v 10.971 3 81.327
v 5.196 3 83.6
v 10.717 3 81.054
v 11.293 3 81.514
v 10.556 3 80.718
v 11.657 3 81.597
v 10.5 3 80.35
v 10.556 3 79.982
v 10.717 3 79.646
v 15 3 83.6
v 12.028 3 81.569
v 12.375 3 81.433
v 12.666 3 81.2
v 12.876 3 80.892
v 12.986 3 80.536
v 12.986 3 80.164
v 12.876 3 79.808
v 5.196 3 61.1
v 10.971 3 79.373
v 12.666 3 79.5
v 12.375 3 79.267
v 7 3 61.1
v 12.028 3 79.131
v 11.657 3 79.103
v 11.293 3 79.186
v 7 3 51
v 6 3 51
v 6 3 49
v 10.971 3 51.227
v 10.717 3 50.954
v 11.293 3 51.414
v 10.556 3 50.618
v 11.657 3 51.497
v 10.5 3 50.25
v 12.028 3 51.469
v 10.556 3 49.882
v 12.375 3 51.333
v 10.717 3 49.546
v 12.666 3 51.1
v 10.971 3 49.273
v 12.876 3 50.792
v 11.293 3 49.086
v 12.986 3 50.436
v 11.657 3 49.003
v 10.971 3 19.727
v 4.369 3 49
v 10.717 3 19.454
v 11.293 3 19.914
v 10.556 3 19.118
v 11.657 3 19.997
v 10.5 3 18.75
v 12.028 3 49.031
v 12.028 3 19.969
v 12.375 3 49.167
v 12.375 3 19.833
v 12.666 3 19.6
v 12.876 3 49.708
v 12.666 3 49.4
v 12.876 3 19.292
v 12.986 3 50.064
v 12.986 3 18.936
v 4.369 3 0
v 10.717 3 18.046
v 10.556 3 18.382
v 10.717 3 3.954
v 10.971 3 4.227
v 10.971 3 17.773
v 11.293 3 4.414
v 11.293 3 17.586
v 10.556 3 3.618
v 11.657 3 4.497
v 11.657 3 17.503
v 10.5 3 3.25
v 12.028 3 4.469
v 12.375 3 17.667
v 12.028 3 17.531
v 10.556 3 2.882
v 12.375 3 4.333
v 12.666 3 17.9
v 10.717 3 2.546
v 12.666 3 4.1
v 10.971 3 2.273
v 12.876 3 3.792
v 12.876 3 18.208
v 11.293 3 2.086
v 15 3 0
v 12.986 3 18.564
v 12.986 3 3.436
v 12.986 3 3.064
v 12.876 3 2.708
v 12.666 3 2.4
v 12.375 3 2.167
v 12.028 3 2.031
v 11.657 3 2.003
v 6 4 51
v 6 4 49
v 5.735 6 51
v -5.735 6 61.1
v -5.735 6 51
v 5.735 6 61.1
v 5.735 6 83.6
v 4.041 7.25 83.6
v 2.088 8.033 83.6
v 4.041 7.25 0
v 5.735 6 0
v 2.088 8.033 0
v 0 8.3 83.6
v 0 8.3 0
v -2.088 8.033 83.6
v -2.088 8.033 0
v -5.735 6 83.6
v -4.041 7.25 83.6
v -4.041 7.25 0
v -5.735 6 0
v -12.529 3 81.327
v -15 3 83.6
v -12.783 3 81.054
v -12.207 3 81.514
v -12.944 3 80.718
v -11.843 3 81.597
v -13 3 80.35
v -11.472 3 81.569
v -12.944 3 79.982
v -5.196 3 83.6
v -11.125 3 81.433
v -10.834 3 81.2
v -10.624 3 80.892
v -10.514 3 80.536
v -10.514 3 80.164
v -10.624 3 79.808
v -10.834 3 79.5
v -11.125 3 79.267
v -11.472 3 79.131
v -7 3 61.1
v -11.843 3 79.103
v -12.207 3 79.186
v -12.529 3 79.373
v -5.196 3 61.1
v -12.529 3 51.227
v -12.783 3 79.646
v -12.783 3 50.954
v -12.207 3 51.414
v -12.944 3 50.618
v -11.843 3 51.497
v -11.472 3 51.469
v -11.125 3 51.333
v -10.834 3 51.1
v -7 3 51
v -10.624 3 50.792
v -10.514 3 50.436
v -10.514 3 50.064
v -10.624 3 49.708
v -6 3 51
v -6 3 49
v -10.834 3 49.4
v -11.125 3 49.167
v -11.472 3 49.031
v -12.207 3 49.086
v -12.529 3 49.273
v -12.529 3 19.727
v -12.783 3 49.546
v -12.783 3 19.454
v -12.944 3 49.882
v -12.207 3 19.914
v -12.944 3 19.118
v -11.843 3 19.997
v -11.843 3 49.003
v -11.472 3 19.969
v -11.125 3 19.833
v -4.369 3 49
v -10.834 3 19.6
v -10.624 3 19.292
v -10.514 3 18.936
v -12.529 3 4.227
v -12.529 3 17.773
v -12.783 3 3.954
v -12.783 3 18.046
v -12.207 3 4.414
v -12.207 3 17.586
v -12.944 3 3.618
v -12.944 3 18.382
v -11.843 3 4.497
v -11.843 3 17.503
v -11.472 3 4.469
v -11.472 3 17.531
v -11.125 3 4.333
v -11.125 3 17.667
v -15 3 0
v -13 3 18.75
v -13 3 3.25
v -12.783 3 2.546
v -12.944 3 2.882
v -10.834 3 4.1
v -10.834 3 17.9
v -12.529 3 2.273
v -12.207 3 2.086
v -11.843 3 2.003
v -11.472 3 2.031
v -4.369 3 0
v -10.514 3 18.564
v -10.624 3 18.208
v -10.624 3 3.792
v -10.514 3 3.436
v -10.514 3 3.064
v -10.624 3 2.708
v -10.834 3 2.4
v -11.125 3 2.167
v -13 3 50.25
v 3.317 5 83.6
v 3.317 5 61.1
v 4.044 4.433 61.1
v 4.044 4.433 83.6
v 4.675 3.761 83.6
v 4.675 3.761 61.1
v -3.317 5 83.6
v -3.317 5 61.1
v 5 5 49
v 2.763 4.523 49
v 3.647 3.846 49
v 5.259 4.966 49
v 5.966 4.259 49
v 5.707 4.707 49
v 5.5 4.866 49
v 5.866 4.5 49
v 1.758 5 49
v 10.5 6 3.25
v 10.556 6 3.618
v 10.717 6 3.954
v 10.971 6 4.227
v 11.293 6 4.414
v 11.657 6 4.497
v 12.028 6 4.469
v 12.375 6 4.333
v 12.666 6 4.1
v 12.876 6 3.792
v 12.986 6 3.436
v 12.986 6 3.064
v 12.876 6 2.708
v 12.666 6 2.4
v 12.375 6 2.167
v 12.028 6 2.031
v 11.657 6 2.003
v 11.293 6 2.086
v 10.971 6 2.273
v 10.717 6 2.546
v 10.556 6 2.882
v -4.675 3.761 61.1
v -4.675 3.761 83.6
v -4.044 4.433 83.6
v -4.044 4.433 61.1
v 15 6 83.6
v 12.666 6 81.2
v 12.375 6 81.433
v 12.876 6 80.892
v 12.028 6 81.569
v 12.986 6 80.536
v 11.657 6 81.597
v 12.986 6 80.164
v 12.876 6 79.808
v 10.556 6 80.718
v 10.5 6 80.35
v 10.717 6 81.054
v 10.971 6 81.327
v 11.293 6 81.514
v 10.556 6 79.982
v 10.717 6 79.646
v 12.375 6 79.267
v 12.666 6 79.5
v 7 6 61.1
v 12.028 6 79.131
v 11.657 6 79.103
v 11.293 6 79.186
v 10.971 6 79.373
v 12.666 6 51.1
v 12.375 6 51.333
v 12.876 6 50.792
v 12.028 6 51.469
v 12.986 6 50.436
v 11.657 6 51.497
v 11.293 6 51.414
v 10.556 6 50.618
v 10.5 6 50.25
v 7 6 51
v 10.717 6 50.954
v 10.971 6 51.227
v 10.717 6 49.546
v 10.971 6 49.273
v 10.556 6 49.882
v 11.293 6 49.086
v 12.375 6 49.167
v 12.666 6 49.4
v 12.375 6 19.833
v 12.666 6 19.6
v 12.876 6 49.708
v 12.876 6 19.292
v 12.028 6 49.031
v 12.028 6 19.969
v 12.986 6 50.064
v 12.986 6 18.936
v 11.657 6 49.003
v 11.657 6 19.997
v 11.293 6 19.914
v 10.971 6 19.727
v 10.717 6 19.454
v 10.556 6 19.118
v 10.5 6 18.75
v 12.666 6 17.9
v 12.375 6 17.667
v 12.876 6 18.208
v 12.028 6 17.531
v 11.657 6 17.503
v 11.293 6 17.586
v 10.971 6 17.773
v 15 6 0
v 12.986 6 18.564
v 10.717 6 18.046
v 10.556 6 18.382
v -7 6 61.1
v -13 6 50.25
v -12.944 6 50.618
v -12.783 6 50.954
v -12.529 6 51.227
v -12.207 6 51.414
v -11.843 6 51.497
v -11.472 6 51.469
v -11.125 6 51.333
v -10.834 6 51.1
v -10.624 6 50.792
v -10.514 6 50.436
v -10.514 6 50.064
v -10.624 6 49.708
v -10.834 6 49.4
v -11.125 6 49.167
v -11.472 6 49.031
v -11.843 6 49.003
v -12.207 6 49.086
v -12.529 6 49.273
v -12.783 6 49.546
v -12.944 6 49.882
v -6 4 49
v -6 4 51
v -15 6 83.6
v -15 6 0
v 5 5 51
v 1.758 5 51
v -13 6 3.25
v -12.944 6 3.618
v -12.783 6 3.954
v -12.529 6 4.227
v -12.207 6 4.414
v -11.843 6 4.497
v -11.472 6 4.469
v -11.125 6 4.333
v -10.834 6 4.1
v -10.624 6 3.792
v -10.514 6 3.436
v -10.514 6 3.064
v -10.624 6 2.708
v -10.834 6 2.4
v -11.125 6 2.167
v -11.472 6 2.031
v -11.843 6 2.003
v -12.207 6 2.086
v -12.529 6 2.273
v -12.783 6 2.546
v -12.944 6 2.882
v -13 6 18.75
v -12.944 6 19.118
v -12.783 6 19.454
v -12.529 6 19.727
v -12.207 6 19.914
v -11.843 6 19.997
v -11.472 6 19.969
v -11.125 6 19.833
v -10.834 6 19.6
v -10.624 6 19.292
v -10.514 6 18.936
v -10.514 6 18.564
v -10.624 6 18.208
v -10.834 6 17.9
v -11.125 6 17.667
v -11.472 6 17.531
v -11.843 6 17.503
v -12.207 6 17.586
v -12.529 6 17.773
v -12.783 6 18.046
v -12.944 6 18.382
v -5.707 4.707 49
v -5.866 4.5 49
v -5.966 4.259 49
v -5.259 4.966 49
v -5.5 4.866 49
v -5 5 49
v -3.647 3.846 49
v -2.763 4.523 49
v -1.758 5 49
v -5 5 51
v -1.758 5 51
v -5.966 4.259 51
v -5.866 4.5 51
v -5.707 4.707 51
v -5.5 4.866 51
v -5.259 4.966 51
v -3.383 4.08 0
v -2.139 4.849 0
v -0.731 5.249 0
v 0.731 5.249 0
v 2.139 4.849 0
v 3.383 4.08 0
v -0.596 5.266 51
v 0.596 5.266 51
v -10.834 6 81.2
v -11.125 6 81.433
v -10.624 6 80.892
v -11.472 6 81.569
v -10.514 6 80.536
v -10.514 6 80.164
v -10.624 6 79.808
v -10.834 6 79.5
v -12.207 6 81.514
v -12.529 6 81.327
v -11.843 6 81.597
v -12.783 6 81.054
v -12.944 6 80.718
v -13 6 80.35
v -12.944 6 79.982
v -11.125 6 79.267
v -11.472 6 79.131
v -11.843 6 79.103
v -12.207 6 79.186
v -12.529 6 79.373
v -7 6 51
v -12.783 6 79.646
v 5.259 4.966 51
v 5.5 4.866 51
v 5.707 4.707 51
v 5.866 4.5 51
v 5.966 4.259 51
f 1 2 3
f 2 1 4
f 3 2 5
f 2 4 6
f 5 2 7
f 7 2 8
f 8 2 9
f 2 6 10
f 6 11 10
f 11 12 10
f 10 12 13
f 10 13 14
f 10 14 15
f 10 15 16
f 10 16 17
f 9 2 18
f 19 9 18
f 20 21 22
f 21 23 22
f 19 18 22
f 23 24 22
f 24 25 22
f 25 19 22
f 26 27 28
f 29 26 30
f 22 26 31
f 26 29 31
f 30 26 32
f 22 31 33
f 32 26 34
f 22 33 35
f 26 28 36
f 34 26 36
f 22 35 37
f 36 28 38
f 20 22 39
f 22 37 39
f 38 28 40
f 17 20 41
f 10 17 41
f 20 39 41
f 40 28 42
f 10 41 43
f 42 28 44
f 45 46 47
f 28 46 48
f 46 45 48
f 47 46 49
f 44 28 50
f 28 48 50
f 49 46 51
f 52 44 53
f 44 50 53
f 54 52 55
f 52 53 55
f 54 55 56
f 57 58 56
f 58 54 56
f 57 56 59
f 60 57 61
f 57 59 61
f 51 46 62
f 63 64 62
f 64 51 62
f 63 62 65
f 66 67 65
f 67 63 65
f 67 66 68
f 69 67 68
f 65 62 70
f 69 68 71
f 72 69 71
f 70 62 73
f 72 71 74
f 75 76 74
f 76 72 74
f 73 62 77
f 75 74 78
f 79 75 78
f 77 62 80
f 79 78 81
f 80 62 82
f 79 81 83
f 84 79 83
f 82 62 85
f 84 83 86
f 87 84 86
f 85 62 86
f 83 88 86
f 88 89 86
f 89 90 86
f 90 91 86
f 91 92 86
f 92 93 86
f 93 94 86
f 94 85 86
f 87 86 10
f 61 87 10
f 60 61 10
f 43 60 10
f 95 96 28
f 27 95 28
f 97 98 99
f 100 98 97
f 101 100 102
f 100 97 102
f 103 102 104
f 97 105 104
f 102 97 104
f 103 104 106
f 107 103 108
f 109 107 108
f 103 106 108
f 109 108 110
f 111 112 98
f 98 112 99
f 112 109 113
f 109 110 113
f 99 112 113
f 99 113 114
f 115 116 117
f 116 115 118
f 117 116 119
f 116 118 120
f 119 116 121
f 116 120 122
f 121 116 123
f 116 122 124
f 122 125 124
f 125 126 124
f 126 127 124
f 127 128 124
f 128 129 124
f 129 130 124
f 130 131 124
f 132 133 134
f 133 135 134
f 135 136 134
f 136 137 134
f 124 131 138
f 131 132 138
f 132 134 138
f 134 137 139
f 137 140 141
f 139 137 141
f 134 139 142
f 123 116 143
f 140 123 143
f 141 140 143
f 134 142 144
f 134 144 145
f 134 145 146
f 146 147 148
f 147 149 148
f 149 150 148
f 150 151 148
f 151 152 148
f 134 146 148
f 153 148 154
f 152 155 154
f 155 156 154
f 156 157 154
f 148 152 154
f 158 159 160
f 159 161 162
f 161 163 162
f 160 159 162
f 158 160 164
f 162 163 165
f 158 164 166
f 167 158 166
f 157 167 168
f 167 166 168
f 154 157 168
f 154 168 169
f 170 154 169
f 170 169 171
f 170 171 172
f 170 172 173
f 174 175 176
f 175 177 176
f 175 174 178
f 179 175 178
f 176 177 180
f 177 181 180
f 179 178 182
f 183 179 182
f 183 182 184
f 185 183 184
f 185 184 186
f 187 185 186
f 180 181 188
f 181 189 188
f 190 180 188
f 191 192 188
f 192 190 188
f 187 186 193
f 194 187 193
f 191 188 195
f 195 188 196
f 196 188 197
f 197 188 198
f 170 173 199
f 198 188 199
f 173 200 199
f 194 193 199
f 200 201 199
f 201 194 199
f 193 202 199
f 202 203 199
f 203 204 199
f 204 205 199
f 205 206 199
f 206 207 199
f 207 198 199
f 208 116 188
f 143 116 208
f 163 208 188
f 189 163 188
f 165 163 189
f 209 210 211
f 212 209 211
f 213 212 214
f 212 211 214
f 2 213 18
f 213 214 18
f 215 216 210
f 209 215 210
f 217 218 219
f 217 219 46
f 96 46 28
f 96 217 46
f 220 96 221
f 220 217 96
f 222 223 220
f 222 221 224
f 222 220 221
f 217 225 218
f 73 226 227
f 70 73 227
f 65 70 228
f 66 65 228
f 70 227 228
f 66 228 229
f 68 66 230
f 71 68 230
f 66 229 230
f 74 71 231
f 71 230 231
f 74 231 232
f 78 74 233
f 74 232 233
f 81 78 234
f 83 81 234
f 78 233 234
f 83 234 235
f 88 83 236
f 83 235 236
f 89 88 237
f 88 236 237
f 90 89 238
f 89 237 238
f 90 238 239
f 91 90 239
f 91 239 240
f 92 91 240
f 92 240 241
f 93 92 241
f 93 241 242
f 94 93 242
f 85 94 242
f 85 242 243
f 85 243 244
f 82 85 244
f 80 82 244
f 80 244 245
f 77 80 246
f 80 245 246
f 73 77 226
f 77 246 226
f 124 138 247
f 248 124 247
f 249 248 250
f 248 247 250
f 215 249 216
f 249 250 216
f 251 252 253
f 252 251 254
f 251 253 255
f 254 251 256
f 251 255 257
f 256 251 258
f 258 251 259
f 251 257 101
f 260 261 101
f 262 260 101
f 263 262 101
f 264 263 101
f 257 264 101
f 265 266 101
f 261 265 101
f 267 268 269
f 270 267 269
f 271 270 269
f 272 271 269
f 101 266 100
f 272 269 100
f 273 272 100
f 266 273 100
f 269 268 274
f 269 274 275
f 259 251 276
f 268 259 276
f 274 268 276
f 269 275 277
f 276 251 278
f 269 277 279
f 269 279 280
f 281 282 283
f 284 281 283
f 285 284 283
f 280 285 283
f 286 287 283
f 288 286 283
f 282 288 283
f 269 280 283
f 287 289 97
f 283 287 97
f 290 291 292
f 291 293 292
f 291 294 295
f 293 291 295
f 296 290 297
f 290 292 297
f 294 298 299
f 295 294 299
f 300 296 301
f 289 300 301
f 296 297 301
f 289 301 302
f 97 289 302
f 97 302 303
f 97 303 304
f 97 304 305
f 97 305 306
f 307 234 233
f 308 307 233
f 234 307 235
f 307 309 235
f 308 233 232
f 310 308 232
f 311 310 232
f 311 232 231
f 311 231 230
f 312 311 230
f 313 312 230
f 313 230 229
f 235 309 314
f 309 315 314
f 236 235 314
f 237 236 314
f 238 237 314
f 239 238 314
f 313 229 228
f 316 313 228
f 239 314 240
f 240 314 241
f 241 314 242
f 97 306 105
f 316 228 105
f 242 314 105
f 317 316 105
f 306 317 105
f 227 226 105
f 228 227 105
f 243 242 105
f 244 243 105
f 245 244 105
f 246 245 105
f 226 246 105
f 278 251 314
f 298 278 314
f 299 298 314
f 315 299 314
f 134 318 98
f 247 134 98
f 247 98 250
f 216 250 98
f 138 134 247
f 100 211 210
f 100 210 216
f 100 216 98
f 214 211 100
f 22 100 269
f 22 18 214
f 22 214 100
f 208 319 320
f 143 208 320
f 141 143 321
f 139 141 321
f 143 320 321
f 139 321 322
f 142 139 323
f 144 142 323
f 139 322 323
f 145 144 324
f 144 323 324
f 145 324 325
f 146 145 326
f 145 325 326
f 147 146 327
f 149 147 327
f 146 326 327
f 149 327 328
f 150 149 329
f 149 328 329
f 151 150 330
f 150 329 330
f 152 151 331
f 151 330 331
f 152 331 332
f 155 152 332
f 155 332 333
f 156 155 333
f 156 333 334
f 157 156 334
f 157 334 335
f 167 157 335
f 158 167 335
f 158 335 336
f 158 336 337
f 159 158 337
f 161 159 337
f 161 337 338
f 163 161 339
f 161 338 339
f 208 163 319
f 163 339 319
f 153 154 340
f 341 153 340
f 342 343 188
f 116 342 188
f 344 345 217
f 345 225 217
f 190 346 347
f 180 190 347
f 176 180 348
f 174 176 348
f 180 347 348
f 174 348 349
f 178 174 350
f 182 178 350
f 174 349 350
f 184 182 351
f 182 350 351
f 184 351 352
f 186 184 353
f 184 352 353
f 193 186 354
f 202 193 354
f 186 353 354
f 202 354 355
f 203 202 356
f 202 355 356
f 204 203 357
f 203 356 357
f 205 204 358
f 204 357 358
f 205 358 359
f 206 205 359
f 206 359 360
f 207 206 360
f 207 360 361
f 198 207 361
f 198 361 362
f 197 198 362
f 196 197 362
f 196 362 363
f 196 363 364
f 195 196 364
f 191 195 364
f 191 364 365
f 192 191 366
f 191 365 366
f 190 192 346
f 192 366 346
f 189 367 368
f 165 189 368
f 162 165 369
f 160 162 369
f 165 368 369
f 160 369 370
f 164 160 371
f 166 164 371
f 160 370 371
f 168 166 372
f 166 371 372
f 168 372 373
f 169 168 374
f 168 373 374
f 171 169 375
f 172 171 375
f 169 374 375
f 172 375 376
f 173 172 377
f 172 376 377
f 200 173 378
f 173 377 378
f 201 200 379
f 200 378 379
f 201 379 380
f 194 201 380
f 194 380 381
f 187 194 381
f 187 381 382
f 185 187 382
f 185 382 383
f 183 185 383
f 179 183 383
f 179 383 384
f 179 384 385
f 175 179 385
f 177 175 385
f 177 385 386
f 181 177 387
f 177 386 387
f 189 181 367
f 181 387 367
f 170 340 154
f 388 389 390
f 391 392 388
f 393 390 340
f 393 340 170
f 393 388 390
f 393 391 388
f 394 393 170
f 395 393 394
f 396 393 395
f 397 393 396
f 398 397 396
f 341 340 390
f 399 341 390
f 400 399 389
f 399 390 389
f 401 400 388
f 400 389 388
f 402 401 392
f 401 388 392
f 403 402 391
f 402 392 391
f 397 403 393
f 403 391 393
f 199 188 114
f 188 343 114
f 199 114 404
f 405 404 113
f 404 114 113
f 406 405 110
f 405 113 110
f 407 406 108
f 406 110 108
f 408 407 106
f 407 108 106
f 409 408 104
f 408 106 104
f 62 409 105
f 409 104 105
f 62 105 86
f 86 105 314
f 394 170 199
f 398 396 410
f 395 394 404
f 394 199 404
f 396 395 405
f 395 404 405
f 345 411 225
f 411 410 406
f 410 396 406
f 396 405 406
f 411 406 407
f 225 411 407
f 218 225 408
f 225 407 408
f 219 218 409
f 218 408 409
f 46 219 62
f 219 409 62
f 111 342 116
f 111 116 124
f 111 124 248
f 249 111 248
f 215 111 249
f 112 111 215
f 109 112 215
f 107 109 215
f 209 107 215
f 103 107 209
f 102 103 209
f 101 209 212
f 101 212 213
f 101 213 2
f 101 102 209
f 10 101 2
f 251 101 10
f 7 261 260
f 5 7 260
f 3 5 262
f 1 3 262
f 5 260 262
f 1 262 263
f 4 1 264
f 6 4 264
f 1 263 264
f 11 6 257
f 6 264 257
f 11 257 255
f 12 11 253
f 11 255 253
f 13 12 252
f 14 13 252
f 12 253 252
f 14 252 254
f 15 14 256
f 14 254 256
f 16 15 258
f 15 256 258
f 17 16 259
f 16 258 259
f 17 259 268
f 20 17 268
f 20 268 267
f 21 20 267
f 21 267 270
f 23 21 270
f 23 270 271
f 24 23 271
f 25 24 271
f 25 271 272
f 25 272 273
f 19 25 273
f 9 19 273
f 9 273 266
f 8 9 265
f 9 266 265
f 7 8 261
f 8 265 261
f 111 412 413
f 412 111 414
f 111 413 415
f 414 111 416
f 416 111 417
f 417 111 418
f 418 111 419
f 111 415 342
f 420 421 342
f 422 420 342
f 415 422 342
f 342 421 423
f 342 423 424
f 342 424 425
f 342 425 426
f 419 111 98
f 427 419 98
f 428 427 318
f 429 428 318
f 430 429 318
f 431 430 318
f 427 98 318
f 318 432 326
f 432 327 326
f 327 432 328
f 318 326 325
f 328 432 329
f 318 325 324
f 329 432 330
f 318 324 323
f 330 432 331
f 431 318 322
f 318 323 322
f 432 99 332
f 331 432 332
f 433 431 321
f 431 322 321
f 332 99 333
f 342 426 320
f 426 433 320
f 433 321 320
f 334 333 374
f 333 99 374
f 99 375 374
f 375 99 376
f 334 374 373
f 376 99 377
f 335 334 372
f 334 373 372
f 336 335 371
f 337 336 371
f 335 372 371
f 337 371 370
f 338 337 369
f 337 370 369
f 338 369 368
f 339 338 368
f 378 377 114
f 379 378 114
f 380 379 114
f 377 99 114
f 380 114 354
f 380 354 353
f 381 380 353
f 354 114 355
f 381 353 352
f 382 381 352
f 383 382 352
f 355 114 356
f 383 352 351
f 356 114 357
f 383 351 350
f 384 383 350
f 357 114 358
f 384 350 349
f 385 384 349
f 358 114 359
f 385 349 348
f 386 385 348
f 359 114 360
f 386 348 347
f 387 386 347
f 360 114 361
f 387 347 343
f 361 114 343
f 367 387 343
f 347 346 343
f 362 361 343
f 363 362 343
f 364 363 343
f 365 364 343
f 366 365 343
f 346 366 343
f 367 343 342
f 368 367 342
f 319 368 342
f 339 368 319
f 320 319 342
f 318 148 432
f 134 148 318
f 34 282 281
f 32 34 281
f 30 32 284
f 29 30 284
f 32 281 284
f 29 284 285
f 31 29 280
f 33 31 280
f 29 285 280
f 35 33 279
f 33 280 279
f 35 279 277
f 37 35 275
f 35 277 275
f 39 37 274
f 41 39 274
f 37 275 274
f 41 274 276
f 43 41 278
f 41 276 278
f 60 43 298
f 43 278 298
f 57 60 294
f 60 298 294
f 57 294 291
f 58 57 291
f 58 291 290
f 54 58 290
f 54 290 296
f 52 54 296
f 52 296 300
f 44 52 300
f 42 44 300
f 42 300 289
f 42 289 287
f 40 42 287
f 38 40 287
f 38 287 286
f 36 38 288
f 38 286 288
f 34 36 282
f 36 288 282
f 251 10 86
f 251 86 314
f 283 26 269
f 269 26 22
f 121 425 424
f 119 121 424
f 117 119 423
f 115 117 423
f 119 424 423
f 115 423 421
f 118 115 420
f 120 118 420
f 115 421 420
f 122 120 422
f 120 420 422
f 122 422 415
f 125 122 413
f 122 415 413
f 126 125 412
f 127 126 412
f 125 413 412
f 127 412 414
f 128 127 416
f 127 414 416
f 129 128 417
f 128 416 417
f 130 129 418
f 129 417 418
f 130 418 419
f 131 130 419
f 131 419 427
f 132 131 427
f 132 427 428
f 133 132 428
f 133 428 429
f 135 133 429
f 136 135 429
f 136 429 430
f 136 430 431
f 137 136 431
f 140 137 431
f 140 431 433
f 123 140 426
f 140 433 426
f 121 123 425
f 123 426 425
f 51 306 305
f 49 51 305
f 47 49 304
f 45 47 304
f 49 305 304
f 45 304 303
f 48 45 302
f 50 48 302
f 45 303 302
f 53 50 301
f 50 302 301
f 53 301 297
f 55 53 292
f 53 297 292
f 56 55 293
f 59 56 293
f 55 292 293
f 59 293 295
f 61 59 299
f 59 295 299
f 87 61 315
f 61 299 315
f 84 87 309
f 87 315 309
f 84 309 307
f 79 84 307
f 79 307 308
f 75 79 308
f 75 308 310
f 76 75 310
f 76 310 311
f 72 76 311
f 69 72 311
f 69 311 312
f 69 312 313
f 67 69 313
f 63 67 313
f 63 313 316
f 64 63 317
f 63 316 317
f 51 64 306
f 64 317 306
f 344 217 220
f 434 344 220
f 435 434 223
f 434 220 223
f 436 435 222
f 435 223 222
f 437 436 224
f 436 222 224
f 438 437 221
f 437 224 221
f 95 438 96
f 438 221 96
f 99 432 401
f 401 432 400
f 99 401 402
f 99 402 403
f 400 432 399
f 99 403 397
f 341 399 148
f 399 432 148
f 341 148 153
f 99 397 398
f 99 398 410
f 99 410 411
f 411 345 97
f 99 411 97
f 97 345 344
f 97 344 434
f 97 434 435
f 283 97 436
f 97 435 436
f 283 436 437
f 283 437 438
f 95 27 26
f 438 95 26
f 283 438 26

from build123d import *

# Parameters (mm, degrees)
BOSS_EXTRUDE1_DEPTH = 22
SKETCH4_R           = 1.25
CUT_EXTRUDE1_DEPTH  = 3
BOSS_EXTRUDE2_DEPTH = 27
BOSS_EXTRUDE3_START = 27
BOSS_EXTRUDE3_DEPTH = 11.1
BOSS_EXTRUDE5_DEPTH = 23.5
SKETCH8_R           = 1.25
CUT_EXTRUDE2_DEPTH  = 3
SKETCH9_W           = 14
SKETCH9_H           = 10.1
CUT_EXTRUDE3_DEPTH  = 3


with BuildPart() as part:
    # Sketch3 → Boss-Extrude1 (new body)
    with BuildSketch(Plane.XY):
        with BuildLine():
            Line((-15, 3), (-4.369210455, 3))
            ThreePointArc((-4.369210455, 3), (0, 5.3), (4.369210455, 3))
            Line((4.369210455, 3), (15, 3))
            Line((15, 3), (15, 6))
            Line((15, 6), (5.734980384, 6))
            ThreePointArc((5.734980384, 6), (0, 8.3), (-5.734980384, 6))
            Line((-5.734980384, 6), (-15, 6))
            Line((-15, 6), (-15, 3))
        make_face()
    extrude(amount=BOSS_EXTRUDE1_DEPTH)

    # Sketch4 → Cut-Extrude1 (cut)
    with BuildSketch(Plane(origin=(0, 6, 0), x_dir=(1, 0, 0), z_dir=(0, 1, 0))):
        with Locations(Location((11.75, -18.75, 0), (0, 0, 180))):
            Circle(SKETCH4_R)
        with Locations(Location((11.75, -3.25, 0), (0, 0, 180))):
            Circle(SKETCH4_R)
        with Locations(Location((-11.75, -3.25, 0), (0, 0, 180))):
            Circle(SKETCH4_R)
        with Locations(Location((-11.75, -18.75, 0), (0, 0, 180))):
            Circle(SKETCH4_R)
    extrude(amount=-CUT_EXTRUDE1_DEPTH, mode=Mode.SUBTRACT)

    # Sketch5 → Boss-Extrude2 (add)
    with BuildSketch(Plane.XY.offset(22)):
        with BuildLine():
            Line((6, 4), (6, 3))
            Line((6, 3), (15, 3))
            Line((15, 3), (15, 6))
            Line((15, 6), (5.734980384, 6))
            ThreePointArc((5.734980384, 6), (0, 8.3), (-5.734980384, 6))
            Line((-5.734980384, 6), (-15, 6))
            Line((-15, 6), (-15, 3))
            Line((-15, 3), (-6, 3))
            Line((-6, 3), (-6, 4))
            ThreePointArc((-6, 4), (-5.707106781, 4.707106781), (-5, 5))
            Line((-5, 5), (-1.757839583, 5))
            ThreePointArc((-1.757839583, 5), (0, 5.3), (1.757839583, 5))
            Line((1.757839583, 5), (5, 5))
            ThreePointArc((5, 5), (5.707106781, 4.707106781), (6, 4))
        make_face()
        with BuildLine():
            ThreePointArc((-4.369210455, 3), (-3.222605397, 4.207708932), (-1.757839583, 5))
            Line((-1.757839583, 5), (-5, 5))
            ThreePointArc((-5, 5), (-5.707106781, 4.707106781), (-6, 4))
            Line((-6, 4), (-6, 3))
            Line((-6, 3), (-4.369210455, 3))
        make_face()
        with BuildLine():
            Line((4.369210455, 3), (6, 3))
            Line((6, 3), (6, 4))
            ThreePointArc((6, 4), (5.707106781, 4.707106781), (5, 5))
            Line((5, 5), (1.757839583, 5))
            ThreePointArc((1.757839583, 5), (3.222605397, 4.207708932), (4.369210455, 3))
        make_face()
    extrude(amount=BOSS_EXTRUDE2_DEPTH)

    # Sketch5<3> → Boss-Extrude3 (add)
    with BuildSketch(Plane.XY.offset(22).offset(BOSS_EXTRUDE3_START)):
        with BuildLine():
            Line((6, 4), (6, 3))
            Line((6, 3), (15, 3))
            Line((15, 3), (15, 6))
            Line((15, 6), (5.734980384, 6))
            ThreePointArc((5.734980384, 6), (0, 8.3), (-5.734980384, 6))
            Line((-5.734980384, 6), (-15, 6))
            Line((-15, 6), (-15, 3))
            Line((-15, 3), (-6, 3))
            Line((-6, 3), (-6, 4))
            ThreePointArc((-6, 4), (-5.707106781, 4.707106781), (-5, 5))
            Line((-5, 5), (-1.757839583, 5))
            ThreePointArc((-1.757839583, 5), (0, 5.3), (1.757839583, 5))
            Line((1.757839583, 5), (5, 5))
            ThreePointArc((5, 5), (5.707106781, 4.707106781), (6, 4))
        make_face()
    extrude(amount=BOSS_EXTRUDE3_DEPTH)

    # Sketch7 → Boss-Extrude5 (add)
    with BuildSketch(Plane.XY.offset(60.1)):
        with BuildLine():
            Line((-15, 6), (-15, 3))
            Line((-15, 3), (-6, 3))
            Line((-6, 3), (-6, 4))
            ThreePointArc((-6, 4), (-5.707106781, 4.707106781), (-5, 5))
            Line((-5, 5), (-1.757839583, 5))
            ThreePointArc((-1.757839583, 5), (0, 5.3), (1.757839583, 5))
            Line((1.757839583, 5), (5, 5))
            ThreePointArc((5, 5), (5.707106781, 4.707106781), (6, 4))
            Line((6, 4), (6, 3))
            Line((6, 3), (15, 3))
            Line((15, 3), (15, 6))
            Line((15, 6), (5.734980384, 6))
            ThreePointArc((5.734980384, 6), (0, 8.3), (-5.734980384, 6))
            Line((-5.734980384, 6), (-15, 6))
        make_face()
        with BuildLine():
            ThreePointArc((-5.196152423, 3), (-4.372281323, 4.108911782), (-3.31662479, 5))
            Line((-3.31662479, 5), (-5, 5))
            ThreePointArc((-5, 5), (-5.707106781, 4.707106781), (-6, 4))
            Line((-6, 4), (-6, 3))
            Line((-6, 3), (-5.196152423, 3))
        make_face()
        with BuildLine():
            Line((5, 5), (3.31662479, 5))
            ThreePointArc((3.31662479, 5), (4.372281323, 4.108911782), (5.196152423, 3))
            Line((5.196152423, 3), (6, 3))
            Line((6, 3), (6, 4))
            ThreePointArc((6, 4), (5.707106781, 4.707106781), (5, 5))
        make_face()
        with BuildLine():
            Line((-1.757839583, 5), (1.757839583, 5))
            ThreePointArc((1.757839583, 5), (0, 5.3), (-1.757839583, 5))
        make_face()
    extrude(amount=BOSS_EXTRUDE5_DEPTH)

    # Sketch8 → Cut-Extrude2 (cut)
    with BuildSketch(Plane(origin=(0, 6, 0), x_dir=(1, 0, 0), z_dir=(0, 1, 0))):
        with Locations(Location((-11.75, -80.35, 0), (0, 0, 180))):
            Circle(SKETCH8_R)
        with Locations(Location((-11.75, -50.25, 0), (0, 0, 180))):
            Circle(SKETCH8_R)
        with Locations(Location((11.75, -50.25, 0), (0, 0, 180))):
            Circle(SKETCH8_R)
        with Locations(Location((11.75, -80.35, 0), (0, 0, 180))):
            Circle(SKETCH8_R)
    extrude(amount=-CUT_EXTRUDE2_DEPTH, mode=Mode.SUBTRACT)

    # Sketch9 → Cut-Extrude3 (cut)
    with BuildSketch(Plane.XZ.offset(-3)):
        with Locations((0, 56.05)):
            Rectangle(SKETCH9_W, SKETCH9_H)
    extrude(amount=-CUT_EXTRUDE3_DEPTH, mode=Mode.SUBTRACT)


solid = part.part
